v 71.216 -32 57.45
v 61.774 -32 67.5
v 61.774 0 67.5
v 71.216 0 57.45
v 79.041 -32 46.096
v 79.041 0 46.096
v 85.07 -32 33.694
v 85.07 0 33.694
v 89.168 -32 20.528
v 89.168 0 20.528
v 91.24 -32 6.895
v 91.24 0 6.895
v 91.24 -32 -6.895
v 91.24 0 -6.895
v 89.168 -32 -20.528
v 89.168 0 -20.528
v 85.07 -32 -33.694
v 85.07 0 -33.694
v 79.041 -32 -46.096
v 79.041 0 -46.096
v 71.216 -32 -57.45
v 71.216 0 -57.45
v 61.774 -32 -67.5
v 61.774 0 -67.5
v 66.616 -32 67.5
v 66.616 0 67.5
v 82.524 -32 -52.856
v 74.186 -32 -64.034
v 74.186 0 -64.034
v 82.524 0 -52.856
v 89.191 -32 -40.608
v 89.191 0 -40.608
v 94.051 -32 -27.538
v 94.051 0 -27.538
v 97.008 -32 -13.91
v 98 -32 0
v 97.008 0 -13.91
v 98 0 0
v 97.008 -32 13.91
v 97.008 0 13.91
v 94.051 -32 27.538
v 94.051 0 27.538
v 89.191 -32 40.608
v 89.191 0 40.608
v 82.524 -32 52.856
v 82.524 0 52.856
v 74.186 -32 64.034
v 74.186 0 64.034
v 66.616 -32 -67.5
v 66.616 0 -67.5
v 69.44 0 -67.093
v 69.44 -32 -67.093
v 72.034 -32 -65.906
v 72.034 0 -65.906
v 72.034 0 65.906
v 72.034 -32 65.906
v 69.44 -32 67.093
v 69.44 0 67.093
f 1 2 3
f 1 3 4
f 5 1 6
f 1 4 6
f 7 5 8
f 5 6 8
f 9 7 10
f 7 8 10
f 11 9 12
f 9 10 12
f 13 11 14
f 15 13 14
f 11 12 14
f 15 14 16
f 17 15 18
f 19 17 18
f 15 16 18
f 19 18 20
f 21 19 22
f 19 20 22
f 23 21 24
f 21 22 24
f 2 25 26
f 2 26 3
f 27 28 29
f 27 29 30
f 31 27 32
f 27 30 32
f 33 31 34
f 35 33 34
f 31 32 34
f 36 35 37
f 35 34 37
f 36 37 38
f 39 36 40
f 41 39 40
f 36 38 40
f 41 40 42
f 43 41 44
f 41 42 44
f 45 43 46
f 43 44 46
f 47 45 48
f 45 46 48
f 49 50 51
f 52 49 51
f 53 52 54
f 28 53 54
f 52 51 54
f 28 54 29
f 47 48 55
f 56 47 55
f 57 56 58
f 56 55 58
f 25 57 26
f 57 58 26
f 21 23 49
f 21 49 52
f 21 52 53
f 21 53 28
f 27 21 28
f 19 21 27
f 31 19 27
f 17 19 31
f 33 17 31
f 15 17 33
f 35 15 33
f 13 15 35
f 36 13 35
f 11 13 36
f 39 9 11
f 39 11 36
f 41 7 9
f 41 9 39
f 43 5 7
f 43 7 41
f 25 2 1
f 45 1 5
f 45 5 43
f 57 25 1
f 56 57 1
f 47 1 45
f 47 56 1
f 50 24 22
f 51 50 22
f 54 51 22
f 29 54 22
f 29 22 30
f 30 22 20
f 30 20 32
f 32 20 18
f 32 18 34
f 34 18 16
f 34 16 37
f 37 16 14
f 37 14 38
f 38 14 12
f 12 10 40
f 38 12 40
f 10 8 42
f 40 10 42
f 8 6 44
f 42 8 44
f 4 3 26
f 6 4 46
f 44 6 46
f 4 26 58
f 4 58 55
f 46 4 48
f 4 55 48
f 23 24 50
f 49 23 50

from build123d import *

# Parameters (mm, degrees)
F1_DEPTH = 32


with BuildPart() as f1:
    # F0 (on Front) → F1 (new body)
    with BuildSketch(Plane.XZ):
        with BuildLine():
            ThreePointArc((61.773781, 67.5), (91.5, 0), (61.773781, -67.5))
            Line((61.773781, -67.5), (66.616439, -67.5))
            ThreePointArc((66.616439, -67.5), (70.779316, -66.592329), (74.186489, -64.034091))
            ThreePointArc((74.186489, -64.034091), (98, 0), (74.186489, 64.034091))
            ThreePointArc((74.186489, 64.034091), (70.779316, 66.592329), (66.616439, 67.5))
            Line((66.616439, 67.5), (61.773781, 67.5))
        make_face()
    extrude(amount=F1_DEPTH)


solid = f1.part
